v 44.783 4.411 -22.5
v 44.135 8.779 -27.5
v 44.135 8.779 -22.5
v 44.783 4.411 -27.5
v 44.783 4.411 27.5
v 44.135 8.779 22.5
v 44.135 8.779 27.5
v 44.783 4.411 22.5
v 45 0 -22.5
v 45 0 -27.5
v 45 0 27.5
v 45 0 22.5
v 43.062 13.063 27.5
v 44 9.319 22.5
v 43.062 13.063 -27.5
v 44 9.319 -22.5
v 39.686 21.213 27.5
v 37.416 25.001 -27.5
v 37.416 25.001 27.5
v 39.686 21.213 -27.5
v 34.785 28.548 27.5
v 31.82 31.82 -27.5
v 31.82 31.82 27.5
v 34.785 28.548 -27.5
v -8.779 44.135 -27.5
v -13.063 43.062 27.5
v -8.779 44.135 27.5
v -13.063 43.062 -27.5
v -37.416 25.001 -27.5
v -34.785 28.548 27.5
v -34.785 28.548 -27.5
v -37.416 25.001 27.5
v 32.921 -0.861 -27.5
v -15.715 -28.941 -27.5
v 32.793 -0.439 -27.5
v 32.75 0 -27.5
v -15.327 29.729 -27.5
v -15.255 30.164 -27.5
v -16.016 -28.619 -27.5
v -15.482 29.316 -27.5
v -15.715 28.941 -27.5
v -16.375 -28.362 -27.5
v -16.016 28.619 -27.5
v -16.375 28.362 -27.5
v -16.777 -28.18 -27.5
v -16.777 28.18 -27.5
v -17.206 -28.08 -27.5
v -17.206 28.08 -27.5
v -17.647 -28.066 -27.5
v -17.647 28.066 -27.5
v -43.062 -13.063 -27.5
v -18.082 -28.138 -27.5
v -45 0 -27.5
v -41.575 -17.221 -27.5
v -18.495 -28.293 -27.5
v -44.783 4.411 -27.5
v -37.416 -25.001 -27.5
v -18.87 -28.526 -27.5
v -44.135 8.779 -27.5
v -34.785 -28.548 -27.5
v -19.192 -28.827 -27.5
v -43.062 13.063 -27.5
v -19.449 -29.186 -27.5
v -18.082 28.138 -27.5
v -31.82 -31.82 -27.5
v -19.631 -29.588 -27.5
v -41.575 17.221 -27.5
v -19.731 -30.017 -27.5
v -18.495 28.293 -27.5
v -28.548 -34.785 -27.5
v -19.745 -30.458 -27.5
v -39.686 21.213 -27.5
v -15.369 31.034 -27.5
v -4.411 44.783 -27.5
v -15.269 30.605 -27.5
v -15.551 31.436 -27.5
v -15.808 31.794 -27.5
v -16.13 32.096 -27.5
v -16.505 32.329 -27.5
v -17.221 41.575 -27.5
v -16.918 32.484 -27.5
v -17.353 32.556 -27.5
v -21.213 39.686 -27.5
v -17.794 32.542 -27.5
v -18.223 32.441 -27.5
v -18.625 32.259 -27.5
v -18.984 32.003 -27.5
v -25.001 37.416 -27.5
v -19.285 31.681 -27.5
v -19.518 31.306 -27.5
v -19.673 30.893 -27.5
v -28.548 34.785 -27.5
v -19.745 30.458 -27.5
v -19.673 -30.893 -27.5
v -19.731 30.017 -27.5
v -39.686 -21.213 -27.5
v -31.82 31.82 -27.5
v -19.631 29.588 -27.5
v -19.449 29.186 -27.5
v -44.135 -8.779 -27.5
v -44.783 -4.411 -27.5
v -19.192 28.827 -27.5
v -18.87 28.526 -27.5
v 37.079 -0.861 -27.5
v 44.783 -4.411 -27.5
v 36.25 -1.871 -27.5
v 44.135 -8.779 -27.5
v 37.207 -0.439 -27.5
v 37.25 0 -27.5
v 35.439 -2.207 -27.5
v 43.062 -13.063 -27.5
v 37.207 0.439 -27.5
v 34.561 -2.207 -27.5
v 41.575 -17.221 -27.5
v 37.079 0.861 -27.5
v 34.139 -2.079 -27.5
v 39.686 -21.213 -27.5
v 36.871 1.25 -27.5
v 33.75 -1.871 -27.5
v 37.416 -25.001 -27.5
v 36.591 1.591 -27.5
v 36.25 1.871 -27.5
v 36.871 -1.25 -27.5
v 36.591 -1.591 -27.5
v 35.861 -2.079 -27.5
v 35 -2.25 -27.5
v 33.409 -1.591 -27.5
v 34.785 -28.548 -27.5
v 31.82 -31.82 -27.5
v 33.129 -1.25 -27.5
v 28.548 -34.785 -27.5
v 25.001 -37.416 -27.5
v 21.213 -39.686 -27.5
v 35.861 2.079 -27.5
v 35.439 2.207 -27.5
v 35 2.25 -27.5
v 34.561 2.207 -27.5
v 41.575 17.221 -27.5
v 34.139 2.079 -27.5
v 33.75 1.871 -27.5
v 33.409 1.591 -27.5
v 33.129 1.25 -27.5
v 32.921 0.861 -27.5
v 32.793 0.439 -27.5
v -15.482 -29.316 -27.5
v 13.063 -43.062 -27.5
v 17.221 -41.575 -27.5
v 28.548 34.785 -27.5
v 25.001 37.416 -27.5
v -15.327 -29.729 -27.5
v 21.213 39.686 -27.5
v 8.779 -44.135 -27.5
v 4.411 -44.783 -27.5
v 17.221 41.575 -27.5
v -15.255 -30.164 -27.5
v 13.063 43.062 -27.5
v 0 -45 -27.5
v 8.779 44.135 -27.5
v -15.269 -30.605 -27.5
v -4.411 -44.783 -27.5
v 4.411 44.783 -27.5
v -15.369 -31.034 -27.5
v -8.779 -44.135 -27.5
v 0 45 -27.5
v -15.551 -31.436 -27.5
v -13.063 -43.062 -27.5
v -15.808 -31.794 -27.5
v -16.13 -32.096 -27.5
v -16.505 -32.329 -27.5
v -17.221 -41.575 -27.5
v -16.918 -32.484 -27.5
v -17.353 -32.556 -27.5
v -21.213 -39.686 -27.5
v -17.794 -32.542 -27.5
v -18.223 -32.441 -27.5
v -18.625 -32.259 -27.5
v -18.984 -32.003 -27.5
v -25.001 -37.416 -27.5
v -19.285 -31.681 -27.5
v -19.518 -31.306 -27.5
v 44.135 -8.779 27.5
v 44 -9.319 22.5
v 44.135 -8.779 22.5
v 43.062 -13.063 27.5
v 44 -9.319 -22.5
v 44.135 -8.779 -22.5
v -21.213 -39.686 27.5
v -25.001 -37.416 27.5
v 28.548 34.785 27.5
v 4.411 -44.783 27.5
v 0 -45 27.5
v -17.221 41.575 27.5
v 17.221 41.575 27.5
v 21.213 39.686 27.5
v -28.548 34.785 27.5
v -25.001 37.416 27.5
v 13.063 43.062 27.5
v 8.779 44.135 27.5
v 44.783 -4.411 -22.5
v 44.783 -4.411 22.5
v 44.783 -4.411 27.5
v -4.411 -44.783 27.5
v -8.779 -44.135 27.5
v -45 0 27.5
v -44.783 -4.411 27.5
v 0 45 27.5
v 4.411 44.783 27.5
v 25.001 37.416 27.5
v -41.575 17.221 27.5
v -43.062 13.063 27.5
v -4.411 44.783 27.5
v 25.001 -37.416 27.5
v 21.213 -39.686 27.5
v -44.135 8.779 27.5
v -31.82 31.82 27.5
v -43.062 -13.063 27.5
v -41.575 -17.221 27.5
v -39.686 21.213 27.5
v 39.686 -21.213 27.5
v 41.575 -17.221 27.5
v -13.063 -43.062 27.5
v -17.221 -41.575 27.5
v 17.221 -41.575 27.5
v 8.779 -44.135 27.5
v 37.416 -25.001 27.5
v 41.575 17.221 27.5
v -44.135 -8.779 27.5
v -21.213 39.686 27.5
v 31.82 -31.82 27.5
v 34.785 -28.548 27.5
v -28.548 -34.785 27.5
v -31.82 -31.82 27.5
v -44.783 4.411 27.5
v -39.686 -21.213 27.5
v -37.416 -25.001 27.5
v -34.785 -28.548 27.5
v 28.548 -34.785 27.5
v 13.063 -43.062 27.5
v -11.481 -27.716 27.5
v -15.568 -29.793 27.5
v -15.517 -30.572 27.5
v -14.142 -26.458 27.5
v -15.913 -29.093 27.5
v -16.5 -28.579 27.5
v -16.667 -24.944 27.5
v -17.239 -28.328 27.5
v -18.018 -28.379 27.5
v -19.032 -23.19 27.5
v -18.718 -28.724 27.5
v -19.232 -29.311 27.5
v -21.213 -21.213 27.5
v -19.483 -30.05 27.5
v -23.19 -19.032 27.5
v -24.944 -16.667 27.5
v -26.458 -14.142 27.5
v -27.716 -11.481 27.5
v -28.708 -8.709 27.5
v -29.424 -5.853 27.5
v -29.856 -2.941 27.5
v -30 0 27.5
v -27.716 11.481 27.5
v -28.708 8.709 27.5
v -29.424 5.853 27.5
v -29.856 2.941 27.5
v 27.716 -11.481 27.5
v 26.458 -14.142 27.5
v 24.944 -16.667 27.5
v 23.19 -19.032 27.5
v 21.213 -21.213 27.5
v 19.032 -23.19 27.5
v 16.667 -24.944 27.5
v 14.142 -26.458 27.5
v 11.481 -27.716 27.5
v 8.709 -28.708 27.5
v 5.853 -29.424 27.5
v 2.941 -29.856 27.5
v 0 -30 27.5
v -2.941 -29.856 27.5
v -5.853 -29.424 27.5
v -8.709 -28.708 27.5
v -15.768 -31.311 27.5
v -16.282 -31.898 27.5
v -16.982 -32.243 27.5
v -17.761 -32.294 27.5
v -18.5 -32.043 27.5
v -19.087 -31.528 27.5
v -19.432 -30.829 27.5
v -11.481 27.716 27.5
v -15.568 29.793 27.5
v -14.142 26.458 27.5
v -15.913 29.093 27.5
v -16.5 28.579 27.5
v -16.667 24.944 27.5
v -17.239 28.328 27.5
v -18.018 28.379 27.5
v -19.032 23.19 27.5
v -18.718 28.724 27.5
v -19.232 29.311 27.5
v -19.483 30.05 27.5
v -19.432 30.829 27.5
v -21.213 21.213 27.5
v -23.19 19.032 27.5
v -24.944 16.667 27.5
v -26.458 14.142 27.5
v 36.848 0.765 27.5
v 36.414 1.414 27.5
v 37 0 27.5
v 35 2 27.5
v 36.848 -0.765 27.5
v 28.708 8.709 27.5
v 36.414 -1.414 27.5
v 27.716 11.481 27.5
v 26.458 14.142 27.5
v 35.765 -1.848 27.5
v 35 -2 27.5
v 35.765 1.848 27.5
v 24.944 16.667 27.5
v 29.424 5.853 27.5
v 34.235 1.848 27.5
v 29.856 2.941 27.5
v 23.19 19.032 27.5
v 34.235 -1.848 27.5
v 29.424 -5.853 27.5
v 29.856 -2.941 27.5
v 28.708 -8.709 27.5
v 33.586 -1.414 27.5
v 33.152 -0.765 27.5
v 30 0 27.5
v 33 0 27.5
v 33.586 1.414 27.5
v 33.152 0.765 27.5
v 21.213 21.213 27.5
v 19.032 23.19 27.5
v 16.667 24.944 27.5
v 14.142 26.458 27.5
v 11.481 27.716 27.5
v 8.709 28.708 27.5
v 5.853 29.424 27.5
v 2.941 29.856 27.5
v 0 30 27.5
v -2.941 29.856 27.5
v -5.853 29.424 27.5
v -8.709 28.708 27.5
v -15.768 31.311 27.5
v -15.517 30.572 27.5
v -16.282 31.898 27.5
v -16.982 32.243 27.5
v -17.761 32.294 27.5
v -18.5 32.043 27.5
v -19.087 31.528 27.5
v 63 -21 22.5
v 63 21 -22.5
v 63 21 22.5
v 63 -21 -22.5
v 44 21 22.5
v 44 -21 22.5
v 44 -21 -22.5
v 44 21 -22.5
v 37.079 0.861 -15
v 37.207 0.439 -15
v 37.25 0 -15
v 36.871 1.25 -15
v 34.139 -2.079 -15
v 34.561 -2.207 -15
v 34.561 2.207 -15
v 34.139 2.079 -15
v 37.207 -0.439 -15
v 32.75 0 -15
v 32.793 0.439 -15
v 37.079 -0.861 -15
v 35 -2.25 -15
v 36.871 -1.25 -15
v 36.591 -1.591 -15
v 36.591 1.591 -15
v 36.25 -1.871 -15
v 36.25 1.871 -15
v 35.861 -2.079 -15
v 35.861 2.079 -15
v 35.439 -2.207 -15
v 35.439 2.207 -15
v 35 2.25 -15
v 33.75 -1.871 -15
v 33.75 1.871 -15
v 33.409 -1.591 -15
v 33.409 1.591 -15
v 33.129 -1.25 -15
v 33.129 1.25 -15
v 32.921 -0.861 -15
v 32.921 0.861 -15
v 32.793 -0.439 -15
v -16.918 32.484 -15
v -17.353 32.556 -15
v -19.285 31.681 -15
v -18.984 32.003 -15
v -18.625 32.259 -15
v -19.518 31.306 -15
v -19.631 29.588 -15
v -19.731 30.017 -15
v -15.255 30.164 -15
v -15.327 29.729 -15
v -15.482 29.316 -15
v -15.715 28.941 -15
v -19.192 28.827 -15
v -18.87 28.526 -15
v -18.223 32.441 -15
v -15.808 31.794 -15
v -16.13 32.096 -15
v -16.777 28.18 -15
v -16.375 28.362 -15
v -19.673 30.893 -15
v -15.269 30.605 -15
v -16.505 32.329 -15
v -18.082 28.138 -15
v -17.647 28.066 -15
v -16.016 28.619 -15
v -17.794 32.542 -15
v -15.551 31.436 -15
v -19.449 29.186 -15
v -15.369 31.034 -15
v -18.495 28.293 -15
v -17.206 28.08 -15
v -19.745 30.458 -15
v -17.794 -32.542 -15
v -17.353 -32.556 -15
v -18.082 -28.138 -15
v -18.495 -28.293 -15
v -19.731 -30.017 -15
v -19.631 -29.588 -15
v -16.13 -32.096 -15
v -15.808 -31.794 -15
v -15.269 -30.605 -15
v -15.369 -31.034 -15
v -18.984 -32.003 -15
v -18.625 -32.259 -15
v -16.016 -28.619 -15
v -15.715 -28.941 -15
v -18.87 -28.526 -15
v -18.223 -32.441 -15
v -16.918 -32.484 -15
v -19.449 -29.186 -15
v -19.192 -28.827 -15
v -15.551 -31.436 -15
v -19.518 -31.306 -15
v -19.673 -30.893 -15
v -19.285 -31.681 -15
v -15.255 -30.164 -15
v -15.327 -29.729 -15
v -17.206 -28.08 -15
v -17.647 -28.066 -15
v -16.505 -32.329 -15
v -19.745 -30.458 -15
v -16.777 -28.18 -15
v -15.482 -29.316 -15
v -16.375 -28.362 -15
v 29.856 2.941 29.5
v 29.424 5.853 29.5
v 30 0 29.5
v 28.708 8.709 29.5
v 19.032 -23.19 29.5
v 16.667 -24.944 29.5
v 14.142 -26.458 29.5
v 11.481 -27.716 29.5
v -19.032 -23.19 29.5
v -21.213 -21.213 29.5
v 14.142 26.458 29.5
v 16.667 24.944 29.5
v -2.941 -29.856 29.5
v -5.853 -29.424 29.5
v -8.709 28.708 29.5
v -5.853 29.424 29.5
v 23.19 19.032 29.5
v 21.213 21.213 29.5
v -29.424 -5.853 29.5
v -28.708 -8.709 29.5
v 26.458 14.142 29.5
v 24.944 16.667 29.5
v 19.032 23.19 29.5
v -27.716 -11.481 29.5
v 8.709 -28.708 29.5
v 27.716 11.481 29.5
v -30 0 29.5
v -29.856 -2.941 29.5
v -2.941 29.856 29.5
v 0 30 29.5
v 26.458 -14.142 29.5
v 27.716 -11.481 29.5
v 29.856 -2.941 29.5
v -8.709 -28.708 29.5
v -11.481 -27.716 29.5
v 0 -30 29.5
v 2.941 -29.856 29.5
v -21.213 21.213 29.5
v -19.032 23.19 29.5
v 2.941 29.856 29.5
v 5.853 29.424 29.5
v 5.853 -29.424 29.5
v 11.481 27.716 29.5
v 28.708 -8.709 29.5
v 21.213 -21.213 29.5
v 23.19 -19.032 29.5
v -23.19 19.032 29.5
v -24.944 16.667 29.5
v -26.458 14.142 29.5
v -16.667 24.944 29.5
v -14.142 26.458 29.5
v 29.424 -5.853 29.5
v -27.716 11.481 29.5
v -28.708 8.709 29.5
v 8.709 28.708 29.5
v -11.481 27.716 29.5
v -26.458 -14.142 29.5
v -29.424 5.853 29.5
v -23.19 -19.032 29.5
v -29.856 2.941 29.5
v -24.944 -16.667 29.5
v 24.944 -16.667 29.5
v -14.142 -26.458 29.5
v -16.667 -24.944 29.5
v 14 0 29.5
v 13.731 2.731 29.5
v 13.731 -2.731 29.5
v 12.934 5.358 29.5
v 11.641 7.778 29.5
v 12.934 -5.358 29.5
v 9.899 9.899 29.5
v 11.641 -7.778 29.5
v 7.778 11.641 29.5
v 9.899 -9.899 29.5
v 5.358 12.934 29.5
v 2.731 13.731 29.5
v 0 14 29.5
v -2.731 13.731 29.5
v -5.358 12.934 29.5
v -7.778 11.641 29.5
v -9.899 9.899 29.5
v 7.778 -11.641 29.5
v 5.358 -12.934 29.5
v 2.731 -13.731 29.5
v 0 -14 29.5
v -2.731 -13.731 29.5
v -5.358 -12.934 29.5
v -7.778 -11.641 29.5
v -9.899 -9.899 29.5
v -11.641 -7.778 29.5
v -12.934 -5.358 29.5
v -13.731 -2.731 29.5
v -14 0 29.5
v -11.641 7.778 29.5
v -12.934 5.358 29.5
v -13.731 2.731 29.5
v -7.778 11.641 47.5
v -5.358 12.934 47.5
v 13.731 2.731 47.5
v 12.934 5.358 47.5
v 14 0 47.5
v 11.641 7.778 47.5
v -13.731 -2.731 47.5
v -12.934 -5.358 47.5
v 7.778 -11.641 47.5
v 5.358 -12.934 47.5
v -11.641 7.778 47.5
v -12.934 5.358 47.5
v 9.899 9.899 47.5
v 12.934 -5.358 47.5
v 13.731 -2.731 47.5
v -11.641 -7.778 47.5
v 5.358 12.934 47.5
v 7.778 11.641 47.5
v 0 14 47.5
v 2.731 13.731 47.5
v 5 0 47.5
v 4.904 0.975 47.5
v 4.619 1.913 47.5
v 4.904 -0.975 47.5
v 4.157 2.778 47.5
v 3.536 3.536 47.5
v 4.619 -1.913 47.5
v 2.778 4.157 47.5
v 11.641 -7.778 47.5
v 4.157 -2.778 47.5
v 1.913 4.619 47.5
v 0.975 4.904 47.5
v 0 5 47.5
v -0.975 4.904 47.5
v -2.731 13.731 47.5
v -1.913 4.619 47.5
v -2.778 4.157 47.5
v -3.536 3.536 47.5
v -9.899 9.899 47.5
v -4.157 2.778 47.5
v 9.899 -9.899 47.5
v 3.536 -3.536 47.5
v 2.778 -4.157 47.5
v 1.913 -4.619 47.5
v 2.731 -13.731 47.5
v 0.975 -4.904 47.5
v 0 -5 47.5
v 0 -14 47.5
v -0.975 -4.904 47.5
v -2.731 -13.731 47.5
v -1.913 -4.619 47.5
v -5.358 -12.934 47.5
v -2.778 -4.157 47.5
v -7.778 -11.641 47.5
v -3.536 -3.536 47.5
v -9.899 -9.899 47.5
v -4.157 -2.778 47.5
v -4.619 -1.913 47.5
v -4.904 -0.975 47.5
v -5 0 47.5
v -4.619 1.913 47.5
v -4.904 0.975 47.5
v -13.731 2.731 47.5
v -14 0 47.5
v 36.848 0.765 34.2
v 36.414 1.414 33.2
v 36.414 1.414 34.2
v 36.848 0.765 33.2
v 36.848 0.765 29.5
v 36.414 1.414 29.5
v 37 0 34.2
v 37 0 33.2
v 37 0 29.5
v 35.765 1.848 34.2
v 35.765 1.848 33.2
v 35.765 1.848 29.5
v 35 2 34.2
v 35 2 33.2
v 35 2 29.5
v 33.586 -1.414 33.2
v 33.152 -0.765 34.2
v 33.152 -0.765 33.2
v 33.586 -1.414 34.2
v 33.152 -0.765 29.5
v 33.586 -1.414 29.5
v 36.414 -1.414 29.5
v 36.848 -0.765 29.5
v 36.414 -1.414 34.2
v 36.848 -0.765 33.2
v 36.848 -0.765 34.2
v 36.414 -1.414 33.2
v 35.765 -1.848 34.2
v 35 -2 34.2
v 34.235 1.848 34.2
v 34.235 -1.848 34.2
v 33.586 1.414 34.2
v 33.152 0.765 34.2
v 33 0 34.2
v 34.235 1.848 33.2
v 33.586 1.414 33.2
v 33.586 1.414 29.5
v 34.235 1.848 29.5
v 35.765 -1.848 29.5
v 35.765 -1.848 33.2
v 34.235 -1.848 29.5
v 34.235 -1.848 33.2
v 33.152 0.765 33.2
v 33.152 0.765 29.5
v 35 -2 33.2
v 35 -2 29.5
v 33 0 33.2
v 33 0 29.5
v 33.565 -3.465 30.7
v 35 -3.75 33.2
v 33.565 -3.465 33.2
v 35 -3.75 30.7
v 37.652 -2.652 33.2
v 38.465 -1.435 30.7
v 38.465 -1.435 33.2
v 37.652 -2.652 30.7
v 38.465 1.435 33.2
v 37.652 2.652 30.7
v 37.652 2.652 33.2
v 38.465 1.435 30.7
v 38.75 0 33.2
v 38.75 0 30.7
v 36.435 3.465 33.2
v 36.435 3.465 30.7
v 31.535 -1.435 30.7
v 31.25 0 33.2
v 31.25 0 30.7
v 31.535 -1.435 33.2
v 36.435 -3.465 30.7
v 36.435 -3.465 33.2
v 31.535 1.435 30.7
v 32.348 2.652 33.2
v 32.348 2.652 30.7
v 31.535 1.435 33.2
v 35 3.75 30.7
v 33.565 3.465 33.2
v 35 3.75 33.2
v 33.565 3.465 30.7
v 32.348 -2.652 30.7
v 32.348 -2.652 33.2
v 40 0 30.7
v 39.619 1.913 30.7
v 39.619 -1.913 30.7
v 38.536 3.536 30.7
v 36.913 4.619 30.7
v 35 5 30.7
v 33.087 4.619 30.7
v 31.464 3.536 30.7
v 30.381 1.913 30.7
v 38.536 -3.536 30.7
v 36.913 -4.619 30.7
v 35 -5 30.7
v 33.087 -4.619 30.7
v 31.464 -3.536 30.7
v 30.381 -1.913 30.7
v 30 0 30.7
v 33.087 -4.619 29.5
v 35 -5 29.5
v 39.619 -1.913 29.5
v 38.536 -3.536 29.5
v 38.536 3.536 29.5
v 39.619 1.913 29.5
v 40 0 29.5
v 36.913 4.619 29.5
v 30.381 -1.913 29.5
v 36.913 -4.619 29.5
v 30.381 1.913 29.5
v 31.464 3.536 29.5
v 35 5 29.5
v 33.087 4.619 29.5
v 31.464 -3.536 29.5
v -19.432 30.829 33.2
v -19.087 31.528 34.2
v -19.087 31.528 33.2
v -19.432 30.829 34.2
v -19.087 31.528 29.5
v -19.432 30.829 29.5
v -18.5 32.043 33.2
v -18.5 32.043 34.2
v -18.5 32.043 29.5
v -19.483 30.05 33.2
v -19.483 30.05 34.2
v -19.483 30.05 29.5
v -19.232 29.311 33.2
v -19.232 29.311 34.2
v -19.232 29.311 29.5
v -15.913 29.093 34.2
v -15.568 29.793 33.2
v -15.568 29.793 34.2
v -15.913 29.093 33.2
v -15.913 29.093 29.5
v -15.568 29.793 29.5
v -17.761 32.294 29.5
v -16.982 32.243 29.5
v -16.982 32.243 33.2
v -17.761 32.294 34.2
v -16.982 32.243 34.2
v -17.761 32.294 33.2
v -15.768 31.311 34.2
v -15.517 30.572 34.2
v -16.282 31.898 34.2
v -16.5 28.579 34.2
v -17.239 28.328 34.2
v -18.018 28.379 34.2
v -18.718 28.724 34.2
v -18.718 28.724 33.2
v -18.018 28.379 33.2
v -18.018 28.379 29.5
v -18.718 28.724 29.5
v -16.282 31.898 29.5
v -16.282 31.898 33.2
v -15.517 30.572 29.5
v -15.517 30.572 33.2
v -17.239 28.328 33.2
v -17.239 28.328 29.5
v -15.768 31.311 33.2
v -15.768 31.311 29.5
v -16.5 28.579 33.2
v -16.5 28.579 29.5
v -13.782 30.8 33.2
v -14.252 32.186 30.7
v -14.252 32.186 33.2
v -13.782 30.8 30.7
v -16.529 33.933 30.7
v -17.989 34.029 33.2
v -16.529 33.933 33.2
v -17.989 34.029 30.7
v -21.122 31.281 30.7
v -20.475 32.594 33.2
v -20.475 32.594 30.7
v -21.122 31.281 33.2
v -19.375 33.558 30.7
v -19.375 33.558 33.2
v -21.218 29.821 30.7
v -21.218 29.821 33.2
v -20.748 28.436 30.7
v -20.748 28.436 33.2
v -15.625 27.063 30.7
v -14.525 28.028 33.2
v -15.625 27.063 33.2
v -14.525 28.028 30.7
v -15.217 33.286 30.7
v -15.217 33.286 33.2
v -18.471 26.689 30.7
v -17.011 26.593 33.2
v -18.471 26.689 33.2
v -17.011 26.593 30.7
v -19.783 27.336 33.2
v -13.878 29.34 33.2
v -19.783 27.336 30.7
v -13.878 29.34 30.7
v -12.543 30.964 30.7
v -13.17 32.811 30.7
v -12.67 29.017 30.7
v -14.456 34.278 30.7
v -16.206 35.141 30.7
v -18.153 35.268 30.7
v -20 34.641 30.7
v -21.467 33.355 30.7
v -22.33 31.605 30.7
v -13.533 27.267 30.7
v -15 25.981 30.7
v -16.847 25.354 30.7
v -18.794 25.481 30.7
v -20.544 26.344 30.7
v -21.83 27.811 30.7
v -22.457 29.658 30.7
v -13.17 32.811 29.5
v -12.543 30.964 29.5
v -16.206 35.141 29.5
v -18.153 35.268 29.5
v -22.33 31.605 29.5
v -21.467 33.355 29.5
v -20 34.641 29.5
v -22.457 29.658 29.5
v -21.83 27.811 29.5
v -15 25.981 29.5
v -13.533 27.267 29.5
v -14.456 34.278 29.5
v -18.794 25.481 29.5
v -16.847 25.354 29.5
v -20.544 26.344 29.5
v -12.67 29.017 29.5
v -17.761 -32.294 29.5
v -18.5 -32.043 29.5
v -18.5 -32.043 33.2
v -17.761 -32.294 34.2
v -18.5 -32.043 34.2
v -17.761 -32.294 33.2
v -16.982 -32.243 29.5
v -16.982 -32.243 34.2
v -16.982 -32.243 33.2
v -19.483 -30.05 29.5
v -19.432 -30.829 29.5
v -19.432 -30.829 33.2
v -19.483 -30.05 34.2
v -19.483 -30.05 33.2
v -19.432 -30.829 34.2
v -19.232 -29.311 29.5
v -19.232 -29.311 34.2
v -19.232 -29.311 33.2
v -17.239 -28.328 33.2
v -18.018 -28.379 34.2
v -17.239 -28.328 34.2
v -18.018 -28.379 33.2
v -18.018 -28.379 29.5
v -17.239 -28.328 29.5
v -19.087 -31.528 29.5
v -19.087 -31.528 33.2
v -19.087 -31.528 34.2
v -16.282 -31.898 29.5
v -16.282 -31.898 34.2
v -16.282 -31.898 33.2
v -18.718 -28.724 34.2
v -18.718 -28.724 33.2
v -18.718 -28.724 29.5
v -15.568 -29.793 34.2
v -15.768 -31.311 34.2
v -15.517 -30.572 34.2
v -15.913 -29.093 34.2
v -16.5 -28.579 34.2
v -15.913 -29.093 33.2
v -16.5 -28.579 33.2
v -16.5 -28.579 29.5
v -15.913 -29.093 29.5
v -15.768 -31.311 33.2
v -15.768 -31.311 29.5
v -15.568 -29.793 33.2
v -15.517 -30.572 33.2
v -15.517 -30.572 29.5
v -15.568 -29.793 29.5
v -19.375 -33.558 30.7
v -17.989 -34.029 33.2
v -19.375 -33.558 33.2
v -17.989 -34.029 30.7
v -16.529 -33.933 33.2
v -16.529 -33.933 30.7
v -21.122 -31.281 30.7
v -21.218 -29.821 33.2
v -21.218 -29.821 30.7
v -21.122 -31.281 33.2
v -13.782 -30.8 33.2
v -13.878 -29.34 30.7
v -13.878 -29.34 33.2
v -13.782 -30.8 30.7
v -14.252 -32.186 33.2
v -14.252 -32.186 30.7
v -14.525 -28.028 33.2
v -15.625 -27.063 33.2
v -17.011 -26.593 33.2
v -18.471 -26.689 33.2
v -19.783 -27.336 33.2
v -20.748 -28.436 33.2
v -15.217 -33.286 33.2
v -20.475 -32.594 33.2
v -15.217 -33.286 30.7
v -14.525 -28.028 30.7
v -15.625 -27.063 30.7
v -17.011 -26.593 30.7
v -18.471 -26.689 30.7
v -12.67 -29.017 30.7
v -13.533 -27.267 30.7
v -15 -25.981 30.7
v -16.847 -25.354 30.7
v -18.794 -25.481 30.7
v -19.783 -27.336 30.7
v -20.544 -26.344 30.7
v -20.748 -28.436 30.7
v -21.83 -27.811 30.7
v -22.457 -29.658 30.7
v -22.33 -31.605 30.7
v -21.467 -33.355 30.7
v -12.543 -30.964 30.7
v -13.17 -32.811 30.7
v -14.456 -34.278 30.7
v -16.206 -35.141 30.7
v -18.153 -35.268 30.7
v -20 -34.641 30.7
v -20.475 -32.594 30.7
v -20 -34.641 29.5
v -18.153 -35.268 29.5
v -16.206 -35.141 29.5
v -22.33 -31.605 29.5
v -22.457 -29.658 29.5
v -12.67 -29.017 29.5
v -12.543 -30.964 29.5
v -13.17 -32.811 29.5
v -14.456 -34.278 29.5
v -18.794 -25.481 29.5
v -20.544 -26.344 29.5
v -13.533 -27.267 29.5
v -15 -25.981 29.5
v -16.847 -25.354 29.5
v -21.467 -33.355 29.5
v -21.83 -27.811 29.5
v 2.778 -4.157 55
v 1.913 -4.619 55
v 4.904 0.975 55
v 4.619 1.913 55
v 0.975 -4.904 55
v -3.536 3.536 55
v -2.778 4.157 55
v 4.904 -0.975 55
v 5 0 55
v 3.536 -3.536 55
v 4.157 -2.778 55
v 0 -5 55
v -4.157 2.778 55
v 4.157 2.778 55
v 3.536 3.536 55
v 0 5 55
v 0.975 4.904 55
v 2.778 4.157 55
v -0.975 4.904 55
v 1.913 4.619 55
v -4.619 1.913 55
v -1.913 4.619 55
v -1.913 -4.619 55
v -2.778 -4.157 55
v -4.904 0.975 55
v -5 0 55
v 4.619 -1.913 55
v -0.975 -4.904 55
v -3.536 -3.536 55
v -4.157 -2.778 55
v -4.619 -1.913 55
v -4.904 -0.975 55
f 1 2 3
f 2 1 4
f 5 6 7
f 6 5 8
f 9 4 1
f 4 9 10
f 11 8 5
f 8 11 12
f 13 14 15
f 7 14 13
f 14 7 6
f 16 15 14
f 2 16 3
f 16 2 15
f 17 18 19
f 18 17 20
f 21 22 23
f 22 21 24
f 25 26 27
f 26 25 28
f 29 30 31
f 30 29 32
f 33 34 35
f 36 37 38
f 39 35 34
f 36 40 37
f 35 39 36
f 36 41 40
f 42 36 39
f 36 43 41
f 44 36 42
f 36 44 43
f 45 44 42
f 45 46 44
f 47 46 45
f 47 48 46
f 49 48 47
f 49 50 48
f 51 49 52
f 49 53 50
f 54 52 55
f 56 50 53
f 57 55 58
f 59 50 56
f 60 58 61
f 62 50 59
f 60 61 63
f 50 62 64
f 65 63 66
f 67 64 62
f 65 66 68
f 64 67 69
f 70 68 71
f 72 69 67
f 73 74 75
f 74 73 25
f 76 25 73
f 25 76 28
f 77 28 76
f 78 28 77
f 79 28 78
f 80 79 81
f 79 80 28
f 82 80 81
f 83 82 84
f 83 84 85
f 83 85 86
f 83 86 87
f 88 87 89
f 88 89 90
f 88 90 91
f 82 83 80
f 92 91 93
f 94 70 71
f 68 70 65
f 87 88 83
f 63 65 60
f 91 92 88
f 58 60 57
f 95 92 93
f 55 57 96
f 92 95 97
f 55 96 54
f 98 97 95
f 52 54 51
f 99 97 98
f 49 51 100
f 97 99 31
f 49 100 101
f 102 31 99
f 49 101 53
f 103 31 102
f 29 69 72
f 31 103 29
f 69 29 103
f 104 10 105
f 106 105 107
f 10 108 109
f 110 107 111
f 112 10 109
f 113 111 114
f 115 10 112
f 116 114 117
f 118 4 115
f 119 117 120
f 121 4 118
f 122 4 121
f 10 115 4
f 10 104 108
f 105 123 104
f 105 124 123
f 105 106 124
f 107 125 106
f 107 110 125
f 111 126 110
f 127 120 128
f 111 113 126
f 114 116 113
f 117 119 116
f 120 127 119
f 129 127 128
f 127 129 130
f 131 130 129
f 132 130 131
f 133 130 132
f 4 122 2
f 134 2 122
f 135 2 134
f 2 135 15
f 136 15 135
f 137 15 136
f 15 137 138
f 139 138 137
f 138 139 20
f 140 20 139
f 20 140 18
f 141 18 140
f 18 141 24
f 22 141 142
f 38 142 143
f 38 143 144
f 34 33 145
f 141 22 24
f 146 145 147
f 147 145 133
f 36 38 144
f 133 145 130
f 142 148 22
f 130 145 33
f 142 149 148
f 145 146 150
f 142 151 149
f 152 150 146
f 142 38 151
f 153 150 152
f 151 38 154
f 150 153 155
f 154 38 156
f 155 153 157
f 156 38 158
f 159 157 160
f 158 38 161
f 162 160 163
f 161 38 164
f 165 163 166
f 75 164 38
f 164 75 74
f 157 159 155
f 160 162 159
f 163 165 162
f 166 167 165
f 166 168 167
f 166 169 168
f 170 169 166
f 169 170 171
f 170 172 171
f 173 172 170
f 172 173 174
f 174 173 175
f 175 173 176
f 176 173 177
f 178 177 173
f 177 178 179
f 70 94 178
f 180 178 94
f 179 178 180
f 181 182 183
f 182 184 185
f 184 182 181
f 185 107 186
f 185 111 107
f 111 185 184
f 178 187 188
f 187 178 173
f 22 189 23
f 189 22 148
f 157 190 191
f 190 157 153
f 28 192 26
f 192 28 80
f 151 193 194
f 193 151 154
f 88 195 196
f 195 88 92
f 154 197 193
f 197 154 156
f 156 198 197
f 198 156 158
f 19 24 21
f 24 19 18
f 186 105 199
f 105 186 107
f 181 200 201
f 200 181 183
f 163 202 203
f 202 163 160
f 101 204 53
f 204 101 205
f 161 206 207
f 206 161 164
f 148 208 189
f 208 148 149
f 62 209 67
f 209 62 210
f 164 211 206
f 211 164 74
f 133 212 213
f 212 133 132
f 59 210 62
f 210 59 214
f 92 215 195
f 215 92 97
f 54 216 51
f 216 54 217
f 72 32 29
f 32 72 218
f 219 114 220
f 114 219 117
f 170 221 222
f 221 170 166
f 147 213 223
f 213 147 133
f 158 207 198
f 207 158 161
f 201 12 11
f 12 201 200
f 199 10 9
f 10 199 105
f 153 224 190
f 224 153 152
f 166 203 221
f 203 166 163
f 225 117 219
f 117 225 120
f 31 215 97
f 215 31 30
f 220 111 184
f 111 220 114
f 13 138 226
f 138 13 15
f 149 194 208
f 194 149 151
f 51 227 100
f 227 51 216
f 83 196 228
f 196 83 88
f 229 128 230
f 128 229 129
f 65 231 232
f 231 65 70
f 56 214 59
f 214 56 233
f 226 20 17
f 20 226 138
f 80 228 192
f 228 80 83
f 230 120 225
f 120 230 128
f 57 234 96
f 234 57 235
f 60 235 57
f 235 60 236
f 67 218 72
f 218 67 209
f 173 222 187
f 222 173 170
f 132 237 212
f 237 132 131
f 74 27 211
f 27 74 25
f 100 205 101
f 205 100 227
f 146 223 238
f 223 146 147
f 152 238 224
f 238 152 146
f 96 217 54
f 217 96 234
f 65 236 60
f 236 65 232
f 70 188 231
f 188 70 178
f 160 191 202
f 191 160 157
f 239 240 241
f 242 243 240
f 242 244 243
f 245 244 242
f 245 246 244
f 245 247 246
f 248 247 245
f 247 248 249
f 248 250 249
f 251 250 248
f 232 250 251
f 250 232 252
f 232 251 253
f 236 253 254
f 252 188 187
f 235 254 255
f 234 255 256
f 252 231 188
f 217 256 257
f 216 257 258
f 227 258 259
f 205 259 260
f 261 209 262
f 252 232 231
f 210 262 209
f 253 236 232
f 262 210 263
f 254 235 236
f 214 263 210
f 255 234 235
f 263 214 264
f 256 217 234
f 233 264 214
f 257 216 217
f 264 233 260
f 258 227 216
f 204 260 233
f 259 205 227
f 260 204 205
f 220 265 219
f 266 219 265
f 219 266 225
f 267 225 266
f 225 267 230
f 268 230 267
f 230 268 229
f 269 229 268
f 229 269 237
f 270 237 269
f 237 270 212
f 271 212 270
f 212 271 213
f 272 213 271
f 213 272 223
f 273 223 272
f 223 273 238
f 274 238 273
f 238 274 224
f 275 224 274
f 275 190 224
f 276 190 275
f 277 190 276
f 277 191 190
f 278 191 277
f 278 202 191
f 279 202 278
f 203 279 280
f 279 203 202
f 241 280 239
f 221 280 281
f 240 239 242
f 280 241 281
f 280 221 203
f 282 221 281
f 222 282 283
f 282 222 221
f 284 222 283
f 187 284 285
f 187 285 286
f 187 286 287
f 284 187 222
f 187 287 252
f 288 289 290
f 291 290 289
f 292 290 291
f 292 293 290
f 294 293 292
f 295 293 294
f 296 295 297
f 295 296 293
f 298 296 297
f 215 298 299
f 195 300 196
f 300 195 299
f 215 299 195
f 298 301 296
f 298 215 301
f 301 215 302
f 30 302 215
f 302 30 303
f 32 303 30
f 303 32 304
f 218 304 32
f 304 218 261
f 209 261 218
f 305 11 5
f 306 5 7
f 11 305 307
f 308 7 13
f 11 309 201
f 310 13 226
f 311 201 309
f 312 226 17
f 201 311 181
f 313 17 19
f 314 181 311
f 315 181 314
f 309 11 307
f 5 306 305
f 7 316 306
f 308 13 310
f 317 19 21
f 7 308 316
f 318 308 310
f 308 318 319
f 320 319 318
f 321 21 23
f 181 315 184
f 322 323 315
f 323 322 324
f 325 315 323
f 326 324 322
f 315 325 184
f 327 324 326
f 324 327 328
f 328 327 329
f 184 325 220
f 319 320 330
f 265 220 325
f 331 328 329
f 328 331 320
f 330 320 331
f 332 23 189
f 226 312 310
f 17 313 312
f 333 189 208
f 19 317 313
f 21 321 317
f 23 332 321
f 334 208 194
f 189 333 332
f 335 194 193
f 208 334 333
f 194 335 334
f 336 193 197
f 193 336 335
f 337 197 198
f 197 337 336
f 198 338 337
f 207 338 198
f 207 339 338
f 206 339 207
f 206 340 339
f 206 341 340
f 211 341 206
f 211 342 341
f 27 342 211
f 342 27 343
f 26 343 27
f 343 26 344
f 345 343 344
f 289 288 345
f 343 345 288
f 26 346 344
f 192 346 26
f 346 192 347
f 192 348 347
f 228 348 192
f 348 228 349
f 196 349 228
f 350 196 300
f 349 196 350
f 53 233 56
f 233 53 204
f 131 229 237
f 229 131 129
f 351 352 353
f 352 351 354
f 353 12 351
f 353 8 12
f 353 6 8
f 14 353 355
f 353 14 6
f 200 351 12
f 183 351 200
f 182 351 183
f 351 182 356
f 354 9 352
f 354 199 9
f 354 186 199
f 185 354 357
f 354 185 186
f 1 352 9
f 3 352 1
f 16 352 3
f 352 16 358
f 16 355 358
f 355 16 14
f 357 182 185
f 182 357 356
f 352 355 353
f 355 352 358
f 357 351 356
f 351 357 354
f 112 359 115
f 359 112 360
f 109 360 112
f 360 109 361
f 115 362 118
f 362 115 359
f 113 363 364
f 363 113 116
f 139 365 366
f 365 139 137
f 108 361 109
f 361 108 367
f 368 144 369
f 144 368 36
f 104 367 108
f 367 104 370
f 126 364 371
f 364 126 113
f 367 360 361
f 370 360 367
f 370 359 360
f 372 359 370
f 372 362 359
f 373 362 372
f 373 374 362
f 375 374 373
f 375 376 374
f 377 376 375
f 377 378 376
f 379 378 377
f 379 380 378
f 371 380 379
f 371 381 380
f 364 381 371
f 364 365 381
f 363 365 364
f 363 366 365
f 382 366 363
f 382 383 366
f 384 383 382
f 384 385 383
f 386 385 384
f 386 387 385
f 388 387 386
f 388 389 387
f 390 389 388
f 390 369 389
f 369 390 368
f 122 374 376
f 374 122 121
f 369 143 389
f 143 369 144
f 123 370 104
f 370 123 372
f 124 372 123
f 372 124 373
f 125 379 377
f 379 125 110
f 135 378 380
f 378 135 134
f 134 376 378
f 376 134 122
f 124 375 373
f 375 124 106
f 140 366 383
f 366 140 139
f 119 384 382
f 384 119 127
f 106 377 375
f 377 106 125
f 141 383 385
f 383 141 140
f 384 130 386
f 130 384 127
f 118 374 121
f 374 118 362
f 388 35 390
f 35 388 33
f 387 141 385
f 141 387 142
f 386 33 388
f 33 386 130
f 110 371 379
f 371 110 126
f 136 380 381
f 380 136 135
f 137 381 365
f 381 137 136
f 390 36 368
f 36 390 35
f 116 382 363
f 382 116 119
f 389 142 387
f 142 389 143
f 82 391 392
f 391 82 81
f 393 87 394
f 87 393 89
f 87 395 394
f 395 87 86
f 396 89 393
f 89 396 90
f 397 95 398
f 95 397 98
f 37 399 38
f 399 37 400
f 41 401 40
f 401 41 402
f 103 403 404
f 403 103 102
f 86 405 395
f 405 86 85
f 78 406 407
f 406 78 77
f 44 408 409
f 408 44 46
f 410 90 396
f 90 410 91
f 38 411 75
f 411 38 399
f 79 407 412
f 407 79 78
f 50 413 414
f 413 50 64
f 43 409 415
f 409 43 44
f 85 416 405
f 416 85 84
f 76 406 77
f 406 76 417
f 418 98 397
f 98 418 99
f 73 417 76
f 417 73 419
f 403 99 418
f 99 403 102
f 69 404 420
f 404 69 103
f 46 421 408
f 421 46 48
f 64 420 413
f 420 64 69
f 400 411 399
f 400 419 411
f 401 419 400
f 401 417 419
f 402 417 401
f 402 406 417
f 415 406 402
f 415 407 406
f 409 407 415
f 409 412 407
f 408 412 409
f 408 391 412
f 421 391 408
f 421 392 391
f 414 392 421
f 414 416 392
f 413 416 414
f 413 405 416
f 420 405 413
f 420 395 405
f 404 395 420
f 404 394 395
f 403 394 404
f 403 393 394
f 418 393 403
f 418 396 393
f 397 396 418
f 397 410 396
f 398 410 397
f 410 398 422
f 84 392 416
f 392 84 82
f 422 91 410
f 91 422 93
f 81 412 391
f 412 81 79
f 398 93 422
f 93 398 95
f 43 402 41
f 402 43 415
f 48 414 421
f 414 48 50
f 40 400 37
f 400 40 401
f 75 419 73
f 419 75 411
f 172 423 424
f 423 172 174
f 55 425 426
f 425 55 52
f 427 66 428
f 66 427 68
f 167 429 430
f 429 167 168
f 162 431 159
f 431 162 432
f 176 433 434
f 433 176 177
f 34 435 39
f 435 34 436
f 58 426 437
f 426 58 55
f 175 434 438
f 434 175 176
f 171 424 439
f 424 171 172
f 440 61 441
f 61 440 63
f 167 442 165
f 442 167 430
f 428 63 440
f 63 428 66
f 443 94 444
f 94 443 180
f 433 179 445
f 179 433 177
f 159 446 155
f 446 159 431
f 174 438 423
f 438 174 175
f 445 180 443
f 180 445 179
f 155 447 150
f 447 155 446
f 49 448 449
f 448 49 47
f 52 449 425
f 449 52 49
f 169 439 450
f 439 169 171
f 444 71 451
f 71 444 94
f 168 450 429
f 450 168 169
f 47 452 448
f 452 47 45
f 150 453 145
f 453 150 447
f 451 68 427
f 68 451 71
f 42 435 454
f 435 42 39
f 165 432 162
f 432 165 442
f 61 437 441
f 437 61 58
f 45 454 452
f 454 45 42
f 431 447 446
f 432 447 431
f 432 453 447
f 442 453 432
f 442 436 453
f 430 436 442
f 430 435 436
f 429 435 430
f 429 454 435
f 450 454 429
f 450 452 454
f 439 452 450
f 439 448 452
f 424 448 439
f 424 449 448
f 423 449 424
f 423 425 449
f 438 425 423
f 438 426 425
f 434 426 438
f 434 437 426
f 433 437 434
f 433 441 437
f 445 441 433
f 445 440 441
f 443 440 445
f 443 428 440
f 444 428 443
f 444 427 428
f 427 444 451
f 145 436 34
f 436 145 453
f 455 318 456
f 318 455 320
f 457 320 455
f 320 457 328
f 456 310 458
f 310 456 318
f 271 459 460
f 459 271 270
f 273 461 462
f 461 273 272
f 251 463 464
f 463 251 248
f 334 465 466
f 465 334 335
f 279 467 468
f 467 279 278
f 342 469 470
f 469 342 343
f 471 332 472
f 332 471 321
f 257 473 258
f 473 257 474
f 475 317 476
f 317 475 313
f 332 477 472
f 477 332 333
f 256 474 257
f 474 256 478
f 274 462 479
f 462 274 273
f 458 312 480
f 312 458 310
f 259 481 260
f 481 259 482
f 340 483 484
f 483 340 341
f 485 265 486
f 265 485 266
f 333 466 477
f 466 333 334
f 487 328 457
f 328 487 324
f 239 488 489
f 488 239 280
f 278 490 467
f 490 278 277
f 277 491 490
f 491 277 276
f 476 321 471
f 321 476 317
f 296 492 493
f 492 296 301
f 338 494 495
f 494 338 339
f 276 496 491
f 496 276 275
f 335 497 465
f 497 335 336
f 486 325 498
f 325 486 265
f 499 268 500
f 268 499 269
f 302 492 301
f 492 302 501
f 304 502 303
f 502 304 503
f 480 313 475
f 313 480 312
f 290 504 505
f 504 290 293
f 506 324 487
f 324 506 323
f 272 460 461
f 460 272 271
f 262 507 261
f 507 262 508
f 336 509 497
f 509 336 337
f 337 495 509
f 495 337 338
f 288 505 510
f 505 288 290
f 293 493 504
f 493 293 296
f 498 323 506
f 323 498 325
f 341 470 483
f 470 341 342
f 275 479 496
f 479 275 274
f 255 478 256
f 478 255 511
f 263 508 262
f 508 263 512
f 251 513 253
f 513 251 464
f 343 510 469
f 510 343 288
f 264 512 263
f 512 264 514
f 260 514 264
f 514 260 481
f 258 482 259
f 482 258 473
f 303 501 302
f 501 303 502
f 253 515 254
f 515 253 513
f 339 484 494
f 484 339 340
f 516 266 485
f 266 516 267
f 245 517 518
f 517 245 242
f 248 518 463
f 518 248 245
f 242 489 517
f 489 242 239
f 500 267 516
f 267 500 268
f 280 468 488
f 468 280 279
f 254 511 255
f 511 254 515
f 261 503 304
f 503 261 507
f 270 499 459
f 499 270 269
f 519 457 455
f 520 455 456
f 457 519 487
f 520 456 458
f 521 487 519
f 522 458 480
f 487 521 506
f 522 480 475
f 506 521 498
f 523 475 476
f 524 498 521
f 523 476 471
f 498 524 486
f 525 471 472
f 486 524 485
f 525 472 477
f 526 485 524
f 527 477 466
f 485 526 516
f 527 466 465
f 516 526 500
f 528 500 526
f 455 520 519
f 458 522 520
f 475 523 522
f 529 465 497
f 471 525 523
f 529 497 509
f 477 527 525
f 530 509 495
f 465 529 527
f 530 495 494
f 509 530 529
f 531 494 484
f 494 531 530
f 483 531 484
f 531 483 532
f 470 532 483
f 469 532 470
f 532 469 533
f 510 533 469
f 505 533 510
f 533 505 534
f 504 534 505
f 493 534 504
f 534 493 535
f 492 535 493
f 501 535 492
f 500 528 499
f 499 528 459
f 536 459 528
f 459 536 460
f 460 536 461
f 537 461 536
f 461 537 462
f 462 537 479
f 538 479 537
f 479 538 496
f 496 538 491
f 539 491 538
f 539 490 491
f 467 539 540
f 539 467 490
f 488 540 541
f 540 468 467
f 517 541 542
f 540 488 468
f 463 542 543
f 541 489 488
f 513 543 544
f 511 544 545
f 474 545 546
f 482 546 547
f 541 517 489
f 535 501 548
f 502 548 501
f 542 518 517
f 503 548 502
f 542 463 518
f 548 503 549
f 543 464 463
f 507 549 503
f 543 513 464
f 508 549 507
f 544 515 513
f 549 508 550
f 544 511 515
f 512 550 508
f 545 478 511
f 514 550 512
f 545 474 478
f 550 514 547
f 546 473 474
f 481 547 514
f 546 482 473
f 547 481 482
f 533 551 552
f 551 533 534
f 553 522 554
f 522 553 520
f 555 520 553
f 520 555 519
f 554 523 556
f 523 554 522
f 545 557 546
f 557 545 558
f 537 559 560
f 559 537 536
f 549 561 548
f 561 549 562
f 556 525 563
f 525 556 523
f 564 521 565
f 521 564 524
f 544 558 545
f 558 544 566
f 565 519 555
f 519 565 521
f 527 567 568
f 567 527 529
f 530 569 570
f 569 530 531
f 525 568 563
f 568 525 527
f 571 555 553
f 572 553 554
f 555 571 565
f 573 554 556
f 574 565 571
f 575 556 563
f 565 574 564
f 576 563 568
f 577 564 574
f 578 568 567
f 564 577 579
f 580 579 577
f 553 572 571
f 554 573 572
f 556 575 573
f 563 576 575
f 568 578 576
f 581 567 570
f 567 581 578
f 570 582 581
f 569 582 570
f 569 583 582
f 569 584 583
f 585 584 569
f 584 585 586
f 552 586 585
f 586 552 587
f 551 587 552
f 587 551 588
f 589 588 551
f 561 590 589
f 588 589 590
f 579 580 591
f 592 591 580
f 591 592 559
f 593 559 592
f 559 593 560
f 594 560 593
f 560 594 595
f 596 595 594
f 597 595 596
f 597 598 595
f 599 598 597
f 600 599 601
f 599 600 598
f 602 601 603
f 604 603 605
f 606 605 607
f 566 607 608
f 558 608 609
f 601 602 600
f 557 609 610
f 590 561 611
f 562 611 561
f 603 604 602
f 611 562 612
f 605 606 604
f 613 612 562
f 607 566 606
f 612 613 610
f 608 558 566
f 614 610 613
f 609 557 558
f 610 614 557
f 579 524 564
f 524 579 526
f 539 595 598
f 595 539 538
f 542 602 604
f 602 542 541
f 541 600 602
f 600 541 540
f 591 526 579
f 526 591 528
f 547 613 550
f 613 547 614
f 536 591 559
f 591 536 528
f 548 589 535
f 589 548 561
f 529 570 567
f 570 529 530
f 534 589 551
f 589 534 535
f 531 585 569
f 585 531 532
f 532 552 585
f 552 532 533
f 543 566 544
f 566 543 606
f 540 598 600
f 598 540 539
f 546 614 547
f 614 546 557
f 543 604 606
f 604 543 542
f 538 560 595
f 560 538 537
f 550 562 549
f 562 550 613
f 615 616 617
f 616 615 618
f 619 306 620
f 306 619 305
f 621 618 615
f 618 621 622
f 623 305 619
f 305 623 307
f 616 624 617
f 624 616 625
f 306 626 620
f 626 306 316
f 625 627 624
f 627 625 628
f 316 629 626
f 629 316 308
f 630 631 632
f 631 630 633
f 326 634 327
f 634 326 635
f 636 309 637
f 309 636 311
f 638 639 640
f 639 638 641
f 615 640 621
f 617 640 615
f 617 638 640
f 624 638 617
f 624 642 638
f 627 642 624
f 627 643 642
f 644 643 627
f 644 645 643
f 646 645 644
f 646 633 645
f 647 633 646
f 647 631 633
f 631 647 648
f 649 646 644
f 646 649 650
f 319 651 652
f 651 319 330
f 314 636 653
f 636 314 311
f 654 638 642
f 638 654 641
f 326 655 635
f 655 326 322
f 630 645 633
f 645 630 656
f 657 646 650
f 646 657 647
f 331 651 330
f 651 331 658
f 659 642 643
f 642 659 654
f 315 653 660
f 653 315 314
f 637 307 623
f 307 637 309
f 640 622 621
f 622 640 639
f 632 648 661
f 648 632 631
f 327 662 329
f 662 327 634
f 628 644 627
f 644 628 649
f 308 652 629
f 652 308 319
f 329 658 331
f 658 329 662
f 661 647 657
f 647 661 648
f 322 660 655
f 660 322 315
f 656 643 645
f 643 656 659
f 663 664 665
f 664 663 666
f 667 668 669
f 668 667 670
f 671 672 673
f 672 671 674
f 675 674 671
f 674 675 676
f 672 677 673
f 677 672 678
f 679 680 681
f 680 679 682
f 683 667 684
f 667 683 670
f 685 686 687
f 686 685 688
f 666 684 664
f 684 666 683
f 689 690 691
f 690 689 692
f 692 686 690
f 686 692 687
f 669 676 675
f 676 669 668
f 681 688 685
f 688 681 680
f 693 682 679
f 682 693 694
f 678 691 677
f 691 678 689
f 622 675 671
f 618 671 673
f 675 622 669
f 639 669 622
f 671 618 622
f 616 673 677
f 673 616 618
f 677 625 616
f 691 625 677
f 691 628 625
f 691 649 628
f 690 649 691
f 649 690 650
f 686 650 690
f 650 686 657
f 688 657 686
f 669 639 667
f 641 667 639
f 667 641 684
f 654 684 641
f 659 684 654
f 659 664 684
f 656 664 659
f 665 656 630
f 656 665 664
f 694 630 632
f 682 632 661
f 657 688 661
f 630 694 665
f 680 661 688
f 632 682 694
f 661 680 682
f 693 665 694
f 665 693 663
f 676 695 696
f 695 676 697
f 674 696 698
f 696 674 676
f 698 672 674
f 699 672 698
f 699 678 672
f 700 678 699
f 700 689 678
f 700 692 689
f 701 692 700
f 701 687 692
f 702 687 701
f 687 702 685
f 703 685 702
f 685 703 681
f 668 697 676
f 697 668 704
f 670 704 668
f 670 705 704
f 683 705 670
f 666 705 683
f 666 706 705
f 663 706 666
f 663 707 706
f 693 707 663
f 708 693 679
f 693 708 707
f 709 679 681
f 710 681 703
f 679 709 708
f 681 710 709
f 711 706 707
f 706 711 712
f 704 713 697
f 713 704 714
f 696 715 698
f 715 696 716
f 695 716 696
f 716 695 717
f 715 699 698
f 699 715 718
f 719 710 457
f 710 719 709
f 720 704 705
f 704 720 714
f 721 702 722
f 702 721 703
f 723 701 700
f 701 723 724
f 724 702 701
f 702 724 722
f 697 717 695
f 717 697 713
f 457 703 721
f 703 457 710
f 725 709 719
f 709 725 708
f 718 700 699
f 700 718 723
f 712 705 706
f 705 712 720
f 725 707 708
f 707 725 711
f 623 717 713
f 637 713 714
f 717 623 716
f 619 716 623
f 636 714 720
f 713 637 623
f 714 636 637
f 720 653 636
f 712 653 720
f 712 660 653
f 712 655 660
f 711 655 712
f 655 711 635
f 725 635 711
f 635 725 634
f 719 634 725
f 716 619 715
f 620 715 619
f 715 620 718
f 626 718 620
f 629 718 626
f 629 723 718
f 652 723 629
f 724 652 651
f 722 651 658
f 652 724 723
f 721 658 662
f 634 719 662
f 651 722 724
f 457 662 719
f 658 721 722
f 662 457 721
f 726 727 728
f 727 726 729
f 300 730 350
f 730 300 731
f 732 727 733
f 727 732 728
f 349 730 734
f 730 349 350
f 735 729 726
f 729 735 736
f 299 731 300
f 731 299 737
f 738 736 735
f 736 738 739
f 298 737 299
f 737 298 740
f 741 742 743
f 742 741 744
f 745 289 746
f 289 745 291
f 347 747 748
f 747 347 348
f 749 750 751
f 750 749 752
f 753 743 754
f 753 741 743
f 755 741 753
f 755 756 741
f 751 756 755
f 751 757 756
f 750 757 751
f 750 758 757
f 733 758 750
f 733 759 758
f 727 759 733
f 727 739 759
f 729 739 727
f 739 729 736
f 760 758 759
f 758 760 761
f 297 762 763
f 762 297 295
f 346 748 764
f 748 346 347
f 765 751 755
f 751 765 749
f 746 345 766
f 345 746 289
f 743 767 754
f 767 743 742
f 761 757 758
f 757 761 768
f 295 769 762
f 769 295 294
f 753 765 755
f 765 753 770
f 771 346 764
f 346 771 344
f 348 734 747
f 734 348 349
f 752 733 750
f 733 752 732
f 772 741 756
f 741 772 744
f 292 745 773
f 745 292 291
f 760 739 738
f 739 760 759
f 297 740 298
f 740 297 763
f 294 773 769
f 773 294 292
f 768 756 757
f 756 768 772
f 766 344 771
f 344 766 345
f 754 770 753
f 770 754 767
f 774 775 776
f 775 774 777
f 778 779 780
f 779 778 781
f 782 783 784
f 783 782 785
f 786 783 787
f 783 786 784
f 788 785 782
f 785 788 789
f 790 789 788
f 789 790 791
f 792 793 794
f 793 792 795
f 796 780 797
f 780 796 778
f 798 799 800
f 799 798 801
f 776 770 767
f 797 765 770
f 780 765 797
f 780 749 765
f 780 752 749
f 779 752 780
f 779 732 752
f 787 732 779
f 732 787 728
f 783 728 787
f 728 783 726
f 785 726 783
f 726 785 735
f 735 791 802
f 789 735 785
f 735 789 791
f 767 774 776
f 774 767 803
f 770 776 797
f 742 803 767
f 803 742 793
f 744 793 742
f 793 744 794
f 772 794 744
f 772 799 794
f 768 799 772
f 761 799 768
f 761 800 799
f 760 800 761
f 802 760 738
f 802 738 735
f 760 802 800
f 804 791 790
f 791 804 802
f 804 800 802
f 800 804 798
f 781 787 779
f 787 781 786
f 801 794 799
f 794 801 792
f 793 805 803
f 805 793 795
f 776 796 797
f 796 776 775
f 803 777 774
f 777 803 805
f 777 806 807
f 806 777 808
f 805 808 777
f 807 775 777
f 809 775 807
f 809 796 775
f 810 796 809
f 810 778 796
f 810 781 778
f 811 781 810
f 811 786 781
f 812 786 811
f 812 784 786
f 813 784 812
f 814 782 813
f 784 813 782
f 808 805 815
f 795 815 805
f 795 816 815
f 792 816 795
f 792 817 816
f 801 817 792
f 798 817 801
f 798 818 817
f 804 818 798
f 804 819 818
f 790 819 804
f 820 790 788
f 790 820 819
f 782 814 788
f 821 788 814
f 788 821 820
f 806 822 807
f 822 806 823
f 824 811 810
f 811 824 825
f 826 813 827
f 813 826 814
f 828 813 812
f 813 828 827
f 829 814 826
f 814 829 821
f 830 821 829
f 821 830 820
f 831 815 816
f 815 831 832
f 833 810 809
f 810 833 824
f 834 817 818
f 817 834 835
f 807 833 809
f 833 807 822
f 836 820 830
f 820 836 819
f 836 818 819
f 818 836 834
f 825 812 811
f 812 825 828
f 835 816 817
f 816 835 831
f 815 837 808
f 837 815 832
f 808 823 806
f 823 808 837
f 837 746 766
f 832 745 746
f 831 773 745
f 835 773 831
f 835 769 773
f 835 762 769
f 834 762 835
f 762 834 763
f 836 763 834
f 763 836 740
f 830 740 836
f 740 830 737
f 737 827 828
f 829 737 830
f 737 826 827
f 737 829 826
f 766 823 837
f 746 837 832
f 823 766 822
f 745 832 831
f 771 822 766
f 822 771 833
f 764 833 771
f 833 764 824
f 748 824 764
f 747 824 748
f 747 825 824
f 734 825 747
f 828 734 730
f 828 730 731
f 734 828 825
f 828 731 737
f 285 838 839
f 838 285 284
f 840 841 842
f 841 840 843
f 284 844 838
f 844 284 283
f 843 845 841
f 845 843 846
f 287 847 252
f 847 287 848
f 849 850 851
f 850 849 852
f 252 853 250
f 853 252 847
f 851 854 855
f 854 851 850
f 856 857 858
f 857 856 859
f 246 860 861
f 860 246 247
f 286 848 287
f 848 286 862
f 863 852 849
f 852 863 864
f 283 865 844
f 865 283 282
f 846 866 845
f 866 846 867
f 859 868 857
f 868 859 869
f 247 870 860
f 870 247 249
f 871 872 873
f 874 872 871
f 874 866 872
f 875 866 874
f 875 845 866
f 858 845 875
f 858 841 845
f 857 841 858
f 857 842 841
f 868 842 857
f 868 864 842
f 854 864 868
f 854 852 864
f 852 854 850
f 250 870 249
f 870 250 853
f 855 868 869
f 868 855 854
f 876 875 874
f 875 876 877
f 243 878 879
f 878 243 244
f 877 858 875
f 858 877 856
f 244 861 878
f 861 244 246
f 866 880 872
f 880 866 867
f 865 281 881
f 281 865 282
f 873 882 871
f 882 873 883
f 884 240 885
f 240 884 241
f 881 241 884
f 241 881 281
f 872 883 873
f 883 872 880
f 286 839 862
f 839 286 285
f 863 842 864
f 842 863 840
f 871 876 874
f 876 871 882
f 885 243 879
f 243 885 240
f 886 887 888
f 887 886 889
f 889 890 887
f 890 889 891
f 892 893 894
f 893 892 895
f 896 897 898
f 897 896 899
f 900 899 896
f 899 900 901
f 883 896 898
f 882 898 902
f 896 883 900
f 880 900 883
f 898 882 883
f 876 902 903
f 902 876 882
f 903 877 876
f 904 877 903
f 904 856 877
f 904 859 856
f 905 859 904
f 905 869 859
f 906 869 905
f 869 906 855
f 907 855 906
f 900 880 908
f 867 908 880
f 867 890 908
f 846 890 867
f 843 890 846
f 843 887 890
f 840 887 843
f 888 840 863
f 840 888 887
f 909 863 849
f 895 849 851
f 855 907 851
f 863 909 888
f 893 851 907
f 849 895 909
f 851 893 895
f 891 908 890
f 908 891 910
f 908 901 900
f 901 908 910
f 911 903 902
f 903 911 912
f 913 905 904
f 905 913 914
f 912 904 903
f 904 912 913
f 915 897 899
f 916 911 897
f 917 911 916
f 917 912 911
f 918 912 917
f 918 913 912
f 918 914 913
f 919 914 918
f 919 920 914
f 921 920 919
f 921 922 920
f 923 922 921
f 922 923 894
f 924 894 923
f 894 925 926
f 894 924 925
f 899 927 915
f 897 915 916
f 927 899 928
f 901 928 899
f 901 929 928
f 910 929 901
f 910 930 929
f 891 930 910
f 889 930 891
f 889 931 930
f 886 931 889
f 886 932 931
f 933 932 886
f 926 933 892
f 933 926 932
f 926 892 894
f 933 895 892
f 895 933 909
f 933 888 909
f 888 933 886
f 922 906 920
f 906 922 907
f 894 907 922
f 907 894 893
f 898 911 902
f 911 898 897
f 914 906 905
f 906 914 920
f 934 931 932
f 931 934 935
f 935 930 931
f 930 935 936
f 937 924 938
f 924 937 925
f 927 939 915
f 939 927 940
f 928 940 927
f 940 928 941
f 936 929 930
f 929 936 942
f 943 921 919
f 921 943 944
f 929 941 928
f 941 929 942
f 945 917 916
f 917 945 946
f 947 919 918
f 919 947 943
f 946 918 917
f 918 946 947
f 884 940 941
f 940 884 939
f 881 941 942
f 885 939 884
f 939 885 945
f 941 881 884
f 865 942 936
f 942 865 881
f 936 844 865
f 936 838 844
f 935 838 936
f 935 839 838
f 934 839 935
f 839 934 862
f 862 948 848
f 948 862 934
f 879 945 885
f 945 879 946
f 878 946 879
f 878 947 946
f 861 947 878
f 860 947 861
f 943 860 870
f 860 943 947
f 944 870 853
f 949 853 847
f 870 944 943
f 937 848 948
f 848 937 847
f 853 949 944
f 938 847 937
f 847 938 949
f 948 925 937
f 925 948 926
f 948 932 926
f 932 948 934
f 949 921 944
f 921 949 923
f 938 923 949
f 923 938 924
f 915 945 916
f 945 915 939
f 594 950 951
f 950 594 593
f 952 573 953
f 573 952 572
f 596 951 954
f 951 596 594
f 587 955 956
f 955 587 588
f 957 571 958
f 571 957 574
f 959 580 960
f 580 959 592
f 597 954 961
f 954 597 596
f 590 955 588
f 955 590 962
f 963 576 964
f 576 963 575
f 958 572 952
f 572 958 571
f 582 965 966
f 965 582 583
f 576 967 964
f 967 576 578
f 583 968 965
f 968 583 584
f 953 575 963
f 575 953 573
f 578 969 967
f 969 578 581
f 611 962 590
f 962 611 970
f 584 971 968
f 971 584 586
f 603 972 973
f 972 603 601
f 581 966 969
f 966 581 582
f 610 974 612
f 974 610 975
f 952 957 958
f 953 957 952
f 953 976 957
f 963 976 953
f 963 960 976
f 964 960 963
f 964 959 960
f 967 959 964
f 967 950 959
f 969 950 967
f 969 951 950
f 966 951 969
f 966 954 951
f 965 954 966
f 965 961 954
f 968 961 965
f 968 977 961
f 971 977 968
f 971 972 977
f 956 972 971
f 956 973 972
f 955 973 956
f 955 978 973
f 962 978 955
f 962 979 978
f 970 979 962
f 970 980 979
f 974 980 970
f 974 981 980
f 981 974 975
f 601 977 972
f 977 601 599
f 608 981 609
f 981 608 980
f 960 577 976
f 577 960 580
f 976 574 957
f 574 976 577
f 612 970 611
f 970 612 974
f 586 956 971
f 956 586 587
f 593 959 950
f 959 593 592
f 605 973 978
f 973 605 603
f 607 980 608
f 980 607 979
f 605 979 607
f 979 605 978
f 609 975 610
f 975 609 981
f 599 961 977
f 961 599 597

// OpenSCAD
// Parameters
thickness = 3; //[1.5:6:0.5]
dial = 1; //[0:1:1]
body_diameter = 90; //[45:180:1]
body_height = 55; //[28:110:1]
bulge_width = 42; //[21:84:1]
bulge_depth = 18; //[9:36:1]
bulge_height = 45; //[22:90:1]
shaft_diameter = 10; //[5:20:0.5]
shaft_length_above = 22; //[10:44:1]
shaft_length_inside = 6; //[3:12:1]
mount_hole_count = 3; //[2:6:1]
mount_hole_circle_diameter = 70; //[35:140:1]
mount_hole_diameter = 4.5; //[2.5:9:0.1]
mount_hole_depth = 12; //[6:24:1]
dial_diameter = 60; //[30:120:1]
dial_thickness = 3; //[1.5:8:0.5]
knob_diameter = 28; //[14:56:1]
knob_height = 18; //[9:36:1]
screw_shank_diameter = 4; //[2:8:0.1]
screw_head_diameter = 7.5; //[4:15:0.1]
screw_head_height = 2.5; //[1:6:0.1]
washer_outer_diameter = 10; //[5:20:0.1]
washer_thickness = 1.2; //[0.6:3:0.1]
overlap = 1; //[0.5:2:0.1]

// Variac Body with Bulge
module variac_body() {
  color("DimGray") {
    union() {
      // Main Body
      translate([0, 0, 0])
        cylinder(r=body_diameter/2, h=body_height, center=true, $fn=64);
      // Bulge
      translate([body_diameter/2 + (bulge_depth + overlap)/2 - overlap, 0, 0])
        cube([bulge_depth + overlap, bulge_width, bulge_height], center=true);
    }
  }
}

// Central Shaft
module central_shaft() {
  color("Silver") {
    translate([0, 0, body_height/4 + (shaft_length_above + shaft_length_inside)/2 - overlap/2])
      cylinder(r=shaft_diameter/2, h=body_height/2 + shaft_length_above + shaft_length_inside, center=true, $fn=32);
  }
}

// Mounting Holes
module mounting_holes() {
  for (i = [0:mount_hole_count-1]) {
    rotate([0, 0, i*360/mount_hole_count])
      translate([mount_hole_circle_diameter/2, 0, -body_height/2 + (mount_hole_depth + overlap)/2 - overlap/2])
        cylinder(r=mount_hole_diameter/2, h=mount_hole_depth + overlap, center=true, $fn=32);
  }
}

// Dial Assembly
module dial_assembly() {
  if (dial == 1) {
    color("Black") {
      union() {
        // Dial Face
        translate([0, 0, body_height/2 + dial_thickness/2 - overlap])
          cylinder(r=dial_diameter/2, h=dial_thickness, center=true, $fn=64);
        // Knob
        translate([0, 0, body_height/2 + dial_thickness + knob_height/2 - overlap])
          cylinder(r=knob_diameter/2, h=knob_height, center=true, $fn=32);
      }
    }
  }
}

// Mounting Screws and Washers
module mounting_screws_and_washers() {
  for (i = [0:mount_hole_count-1]) {
    rotate([0, 0, i*360/mount_hole_count]) {
      // Screw Shank
      translate([mount_hole_circle_diameter/2, 0, body_height/2 + (thickness + washer_thickness + screw_head_height + overlap)/2 - overlap])
        cylinder(r=screw_shank_diameter/2, h=thickness + washer_thickness + screw_head_height + overlap, center=true, $fn=16);
      // Screw Head
      translate([mount_hole_circle_diameter/2, 0, body_height/2 + thickness + washer_thickness + screw_head_height/2 - overlap])
        cylinder(r=screw_head_diameter/2, h=screw_head_height, center=true, $fn=16);
      // Washer
      translate([mount_hole_circle_diameter/2, 0, body_height/2 + thickness + washer_thickness/2 - overlap])
        cylinder(r=washer_outer_diameter/2, h=washer_thickness, center=true, $fn=16);
    }
  }
}

// Complete Variac Assembly
module variac() {
  difference() {
    variac_body();
    mounting_holes();
  }
  central_shaft();
  dial_assembly();
  mounting_screws_and_washers();
}

// Final Assembly
module assembly() {
  variac();
}

assembly();
